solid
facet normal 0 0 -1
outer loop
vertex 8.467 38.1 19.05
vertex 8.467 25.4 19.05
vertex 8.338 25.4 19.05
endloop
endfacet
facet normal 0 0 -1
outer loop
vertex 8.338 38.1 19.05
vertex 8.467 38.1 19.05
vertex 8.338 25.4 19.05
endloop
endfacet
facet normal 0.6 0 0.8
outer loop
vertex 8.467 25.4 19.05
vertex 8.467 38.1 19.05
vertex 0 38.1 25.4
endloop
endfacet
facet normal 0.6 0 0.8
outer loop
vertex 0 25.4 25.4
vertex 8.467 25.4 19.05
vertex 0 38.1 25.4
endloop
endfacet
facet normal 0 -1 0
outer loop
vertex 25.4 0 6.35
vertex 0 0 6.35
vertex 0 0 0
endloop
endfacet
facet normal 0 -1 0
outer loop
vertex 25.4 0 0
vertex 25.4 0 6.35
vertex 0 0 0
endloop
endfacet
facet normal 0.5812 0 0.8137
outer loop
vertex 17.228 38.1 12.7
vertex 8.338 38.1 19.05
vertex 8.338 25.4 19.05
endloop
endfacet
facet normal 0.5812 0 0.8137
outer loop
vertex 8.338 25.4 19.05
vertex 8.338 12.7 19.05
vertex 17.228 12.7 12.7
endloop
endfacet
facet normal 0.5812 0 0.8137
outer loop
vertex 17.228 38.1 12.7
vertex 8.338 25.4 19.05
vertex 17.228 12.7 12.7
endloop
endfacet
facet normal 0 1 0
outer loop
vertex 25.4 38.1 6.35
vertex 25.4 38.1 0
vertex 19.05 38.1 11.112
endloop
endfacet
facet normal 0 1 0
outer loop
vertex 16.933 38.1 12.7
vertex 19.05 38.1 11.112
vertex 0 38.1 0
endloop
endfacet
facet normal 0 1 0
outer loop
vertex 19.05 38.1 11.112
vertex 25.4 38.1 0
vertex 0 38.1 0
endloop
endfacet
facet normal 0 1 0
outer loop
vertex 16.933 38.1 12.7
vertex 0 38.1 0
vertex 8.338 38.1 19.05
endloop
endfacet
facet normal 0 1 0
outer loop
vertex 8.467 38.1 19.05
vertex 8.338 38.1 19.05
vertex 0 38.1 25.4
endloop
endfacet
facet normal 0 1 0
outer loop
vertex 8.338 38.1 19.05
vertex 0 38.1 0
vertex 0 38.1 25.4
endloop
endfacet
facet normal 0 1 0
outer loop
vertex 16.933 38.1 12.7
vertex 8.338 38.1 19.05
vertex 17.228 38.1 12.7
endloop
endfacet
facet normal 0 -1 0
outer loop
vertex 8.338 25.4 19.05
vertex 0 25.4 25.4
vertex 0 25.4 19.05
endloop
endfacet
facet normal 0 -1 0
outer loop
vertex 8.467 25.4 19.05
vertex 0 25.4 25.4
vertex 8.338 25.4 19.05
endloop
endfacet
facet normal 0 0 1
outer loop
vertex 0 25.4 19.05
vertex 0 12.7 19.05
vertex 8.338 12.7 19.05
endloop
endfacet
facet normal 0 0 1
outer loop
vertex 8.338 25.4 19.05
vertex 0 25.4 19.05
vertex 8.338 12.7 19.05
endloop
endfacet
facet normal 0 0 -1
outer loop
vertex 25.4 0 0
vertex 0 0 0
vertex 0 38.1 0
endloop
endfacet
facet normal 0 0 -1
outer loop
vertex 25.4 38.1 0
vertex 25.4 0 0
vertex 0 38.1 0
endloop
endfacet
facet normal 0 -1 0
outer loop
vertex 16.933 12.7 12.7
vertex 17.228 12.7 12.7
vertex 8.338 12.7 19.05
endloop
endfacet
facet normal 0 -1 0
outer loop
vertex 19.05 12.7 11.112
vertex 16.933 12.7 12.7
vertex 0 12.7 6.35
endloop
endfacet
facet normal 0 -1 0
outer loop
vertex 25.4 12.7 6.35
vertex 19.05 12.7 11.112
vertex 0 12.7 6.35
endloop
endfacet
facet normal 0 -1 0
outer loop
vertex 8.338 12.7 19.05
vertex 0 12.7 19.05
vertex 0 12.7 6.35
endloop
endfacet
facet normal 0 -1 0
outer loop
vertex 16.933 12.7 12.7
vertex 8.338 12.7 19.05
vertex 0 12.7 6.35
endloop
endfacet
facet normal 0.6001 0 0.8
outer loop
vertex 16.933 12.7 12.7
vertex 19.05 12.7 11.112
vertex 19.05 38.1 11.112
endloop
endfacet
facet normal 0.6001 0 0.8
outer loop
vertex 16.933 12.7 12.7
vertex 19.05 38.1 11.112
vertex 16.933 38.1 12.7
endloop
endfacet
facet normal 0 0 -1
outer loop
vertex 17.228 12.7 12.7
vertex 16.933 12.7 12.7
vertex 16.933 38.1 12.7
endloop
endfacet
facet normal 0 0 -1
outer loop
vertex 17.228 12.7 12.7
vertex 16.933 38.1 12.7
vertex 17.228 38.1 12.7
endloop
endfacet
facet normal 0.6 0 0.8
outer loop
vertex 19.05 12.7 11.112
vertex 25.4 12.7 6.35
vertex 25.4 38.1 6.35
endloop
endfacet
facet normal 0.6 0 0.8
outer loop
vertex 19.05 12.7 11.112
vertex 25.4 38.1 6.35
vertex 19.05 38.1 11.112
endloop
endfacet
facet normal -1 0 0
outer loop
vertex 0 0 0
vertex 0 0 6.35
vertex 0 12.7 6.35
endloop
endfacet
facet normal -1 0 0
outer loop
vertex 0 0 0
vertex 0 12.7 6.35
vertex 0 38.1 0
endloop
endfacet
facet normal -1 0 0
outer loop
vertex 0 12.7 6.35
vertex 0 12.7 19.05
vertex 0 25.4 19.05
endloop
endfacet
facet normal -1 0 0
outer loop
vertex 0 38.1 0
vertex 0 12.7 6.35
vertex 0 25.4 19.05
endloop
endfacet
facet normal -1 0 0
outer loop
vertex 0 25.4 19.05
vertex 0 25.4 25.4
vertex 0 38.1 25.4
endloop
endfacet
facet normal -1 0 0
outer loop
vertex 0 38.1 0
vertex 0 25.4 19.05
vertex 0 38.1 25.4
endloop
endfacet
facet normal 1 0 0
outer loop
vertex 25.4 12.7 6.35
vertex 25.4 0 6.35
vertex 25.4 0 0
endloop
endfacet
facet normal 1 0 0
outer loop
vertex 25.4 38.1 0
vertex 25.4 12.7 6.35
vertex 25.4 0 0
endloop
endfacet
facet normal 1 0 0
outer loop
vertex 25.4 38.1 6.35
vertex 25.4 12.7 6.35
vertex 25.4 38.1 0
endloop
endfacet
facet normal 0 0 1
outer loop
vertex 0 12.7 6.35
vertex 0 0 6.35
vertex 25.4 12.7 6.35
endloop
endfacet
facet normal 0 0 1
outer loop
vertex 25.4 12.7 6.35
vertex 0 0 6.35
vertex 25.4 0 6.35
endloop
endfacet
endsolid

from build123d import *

# Parameters (mm, degrees)
F2_DEPTH  = 25.4
F3_DEPTH  = 25.4
F5_DEPTH  = 12.7
F7_DEPTH  = 12.7
F9_DEPTH  = 25.4
F10_DEPTH = 12.7
F11_DEPTH = 12.7


with BuildPart() as f2:
    # F1 (on Right) → F2 (new body)
    with BuildSketch(Plane.YZ):
        Polygon((0, 6.35), (0, 0), (38.1, 0), (38.1, 6.35), (25.4, 6.35), (12.7, 6.35), align=None)
        Polygon((25.4, 6.35), (38.1, 6.35), (38.1, 25.4), (25.4, 25.4), (25.4, 19.05), (12.7, 19.05), (12.7, 12.7), (25.4, 12.7), align=None)
    extrude(amount=F2_DEPTH)

    # F0 (on Front) → F3 (join)
    with BuildSketch(Plane.XZ):
        Polygon((0, 6.35), (0, 0), (25.4, 0), (25.4, 6.35), (19.05, 6.35), align=None)
        Polygon((0, 19.05), (0, 6.35), (19.05, 6.35), (19.05, 11.1125), (8.4666666667, 19.05), align=None)
        Polygon((19.05, 6.35), (25.4, 6.35), (19.05, 11.1125), align=None)
        Polygon((0, 25.4), (0, 19.05), (8.4666666667, 19.05), align=None)
    extrude(amount=-F3_DEPTH)

    # F4 (on face) → F5 (cut)
    with BuildSketch(Plane.XZ):
        Polygon((25.4, 6.35), (0, 25.4), (0, 6.35), align=None)
    extrude(amount=-F5_DEPTH, mode=Mode.SUBTRACT)

    # F7 (cut): a face of the model
    f7_faces = [f2.faces().sort_by_distance(p)[0] for p in [
        (14.6755555556, 25.4, 22.4366666667),
    ]]
    extrude(f7_faces, amount=-F7_DEPTH, mode=Mode.SUBTRACT)

    # F8 (on face) → F9 (cut)
    with BuildSketch(Plane.XZ.offset(-12.7)):
        Polygon((8.4666666667, 19.05), (8.3384562082, 19.05), (17.2284582002, 12.7), (25.4, 12.7), (25.4, 19.05), align=None)
    extrude(amount=-F9_DEPTH, mode=Mode.SUBTRACT)

    # F6 (on face) → F10 (cut)
    with BuildSketch(Plane.XZ.offset(-12.7)):
        Polygon((0, 19.05), (8.4666666667, 19.05), (0, 25.4), align=None)
    extrude(amount=-F10_DEPTH, mode=Mode.SUBTRACT)

    # F11 (cut): a face of the model
    f11_faces = [f2.faces().sort_by_distance(p)[0] for p in [
        (22.5777777778, 25.4, 10.5833333333),
    ]]
    extrude(f11_faces, amount=-F11_DEPTH, mode=Mode.SUBTRACT)


solid = f2.part
